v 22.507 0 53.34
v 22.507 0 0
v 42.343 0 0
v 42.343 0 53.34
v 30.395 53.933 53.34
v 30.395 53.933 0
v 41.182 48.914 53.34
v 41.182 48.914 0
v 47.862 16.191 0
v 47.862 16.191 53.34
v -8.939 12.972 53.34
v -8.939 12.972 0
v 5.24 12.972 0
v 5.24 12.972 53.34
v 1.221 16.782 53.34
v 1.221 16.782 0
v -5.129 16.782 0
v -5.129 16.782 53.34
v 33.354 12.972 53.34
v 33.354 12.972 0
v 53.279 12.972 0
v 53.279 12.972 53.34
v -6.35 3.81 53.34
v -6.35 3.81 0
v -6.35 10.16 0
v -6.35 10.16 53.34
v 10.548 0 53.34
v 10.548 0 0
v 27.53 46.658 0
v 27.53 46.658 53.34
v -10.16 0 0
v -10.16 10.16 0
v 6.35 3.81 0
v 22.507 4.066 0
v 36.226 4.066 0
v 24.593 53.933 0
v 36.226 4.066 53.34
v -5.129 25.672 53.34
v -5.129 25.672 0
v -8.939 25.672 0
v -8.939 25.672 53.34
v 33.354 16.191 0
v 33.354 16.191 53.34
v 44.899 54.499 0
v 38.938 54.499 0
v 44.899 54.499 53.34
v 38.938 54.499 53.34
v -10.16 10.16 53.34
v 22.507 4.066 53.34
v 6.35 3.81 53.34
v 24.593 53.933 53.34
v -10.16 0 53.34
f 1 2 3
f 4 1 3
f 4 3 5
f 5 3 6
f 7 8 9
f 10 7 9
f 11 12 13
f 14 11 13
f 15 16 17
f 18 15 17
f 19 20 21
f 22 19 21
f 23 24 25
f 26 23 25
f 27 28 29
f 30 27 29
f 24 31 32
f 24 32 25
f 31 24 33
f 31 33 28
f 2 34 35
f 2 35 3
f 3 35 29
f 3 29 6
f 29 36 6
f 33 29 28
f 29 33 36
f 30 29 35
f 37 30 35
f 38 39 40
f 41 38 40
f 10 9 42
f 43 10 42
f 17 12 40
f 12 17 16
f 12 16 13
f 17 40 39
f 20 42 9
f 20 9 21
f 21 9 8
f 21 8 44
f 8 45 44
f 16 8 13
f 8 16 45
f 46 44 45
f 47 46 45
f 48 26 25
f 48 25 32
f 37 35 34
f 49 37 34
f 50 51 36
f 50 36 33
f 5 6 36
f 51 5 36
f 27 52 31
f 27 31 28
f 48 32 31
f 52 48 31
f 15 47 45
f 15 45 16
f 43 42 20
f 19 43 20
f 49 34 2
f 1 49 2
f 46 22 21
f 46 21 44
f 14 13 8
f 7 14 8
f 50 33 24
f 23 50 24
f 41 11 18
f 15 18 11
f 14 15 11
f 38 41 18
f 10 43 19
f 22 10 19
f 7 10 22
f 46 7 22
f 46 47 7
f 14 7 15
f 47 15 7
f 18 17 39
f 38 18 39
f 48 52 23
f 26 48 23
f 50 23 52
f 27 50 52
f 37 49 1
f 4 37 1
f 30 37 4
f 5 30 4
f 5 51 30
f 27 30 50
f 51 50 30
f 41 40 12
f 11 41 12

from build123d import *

# Parameters (mm, degrees)
F1_DEPTH = 53.34
F3_DEPTH = 53.34


with BuildPart() as f1:
    # F0 (on Top) → F1 (new body)
    with BuildSketch(Plane.XY):
        Polygon((-10.16, 0), (0, 0), (10.548327, 0), (27.530299, 46.657585), (36.225777, 4.066115), (22.50699, 4.066115), (22.50699, 0), (42.343471, 0), (30.39494, 53.933204), (24.593354, 53.933204), (6.35, 3.81), (0, 3.81), (-6.35, 3.81), (-6.35, 10.16), (-10.16, 10.16), align=None)
    extrude(amount=F1_DEPTH)


with BuildPart() as f3:
    # F2 (on Top) → F3 (new body)
    with BuildSketch(Plane.XY):
        Polygon((-8.939057, 12.972061), (-3.6394, 12.972061), (5.24005, 12.972061), (41.1817, 48.913711), (47.862441, 16.190659), (33.354439, 16.190659), (33.354439, 12.972061), (53.278603, 12.972061), (44.899281, 54.499136), (38.938018, 54.499136), (1.220943, 16.782061), (-1.954057, 16.782061), (-5.129057, 16.782061), (-5.129057, 25.672061), (-8.939057, 25.672061), align=None)
    extrude(amount=F3_DEPTH)


solid = Compound([f1.part, f3.part])
